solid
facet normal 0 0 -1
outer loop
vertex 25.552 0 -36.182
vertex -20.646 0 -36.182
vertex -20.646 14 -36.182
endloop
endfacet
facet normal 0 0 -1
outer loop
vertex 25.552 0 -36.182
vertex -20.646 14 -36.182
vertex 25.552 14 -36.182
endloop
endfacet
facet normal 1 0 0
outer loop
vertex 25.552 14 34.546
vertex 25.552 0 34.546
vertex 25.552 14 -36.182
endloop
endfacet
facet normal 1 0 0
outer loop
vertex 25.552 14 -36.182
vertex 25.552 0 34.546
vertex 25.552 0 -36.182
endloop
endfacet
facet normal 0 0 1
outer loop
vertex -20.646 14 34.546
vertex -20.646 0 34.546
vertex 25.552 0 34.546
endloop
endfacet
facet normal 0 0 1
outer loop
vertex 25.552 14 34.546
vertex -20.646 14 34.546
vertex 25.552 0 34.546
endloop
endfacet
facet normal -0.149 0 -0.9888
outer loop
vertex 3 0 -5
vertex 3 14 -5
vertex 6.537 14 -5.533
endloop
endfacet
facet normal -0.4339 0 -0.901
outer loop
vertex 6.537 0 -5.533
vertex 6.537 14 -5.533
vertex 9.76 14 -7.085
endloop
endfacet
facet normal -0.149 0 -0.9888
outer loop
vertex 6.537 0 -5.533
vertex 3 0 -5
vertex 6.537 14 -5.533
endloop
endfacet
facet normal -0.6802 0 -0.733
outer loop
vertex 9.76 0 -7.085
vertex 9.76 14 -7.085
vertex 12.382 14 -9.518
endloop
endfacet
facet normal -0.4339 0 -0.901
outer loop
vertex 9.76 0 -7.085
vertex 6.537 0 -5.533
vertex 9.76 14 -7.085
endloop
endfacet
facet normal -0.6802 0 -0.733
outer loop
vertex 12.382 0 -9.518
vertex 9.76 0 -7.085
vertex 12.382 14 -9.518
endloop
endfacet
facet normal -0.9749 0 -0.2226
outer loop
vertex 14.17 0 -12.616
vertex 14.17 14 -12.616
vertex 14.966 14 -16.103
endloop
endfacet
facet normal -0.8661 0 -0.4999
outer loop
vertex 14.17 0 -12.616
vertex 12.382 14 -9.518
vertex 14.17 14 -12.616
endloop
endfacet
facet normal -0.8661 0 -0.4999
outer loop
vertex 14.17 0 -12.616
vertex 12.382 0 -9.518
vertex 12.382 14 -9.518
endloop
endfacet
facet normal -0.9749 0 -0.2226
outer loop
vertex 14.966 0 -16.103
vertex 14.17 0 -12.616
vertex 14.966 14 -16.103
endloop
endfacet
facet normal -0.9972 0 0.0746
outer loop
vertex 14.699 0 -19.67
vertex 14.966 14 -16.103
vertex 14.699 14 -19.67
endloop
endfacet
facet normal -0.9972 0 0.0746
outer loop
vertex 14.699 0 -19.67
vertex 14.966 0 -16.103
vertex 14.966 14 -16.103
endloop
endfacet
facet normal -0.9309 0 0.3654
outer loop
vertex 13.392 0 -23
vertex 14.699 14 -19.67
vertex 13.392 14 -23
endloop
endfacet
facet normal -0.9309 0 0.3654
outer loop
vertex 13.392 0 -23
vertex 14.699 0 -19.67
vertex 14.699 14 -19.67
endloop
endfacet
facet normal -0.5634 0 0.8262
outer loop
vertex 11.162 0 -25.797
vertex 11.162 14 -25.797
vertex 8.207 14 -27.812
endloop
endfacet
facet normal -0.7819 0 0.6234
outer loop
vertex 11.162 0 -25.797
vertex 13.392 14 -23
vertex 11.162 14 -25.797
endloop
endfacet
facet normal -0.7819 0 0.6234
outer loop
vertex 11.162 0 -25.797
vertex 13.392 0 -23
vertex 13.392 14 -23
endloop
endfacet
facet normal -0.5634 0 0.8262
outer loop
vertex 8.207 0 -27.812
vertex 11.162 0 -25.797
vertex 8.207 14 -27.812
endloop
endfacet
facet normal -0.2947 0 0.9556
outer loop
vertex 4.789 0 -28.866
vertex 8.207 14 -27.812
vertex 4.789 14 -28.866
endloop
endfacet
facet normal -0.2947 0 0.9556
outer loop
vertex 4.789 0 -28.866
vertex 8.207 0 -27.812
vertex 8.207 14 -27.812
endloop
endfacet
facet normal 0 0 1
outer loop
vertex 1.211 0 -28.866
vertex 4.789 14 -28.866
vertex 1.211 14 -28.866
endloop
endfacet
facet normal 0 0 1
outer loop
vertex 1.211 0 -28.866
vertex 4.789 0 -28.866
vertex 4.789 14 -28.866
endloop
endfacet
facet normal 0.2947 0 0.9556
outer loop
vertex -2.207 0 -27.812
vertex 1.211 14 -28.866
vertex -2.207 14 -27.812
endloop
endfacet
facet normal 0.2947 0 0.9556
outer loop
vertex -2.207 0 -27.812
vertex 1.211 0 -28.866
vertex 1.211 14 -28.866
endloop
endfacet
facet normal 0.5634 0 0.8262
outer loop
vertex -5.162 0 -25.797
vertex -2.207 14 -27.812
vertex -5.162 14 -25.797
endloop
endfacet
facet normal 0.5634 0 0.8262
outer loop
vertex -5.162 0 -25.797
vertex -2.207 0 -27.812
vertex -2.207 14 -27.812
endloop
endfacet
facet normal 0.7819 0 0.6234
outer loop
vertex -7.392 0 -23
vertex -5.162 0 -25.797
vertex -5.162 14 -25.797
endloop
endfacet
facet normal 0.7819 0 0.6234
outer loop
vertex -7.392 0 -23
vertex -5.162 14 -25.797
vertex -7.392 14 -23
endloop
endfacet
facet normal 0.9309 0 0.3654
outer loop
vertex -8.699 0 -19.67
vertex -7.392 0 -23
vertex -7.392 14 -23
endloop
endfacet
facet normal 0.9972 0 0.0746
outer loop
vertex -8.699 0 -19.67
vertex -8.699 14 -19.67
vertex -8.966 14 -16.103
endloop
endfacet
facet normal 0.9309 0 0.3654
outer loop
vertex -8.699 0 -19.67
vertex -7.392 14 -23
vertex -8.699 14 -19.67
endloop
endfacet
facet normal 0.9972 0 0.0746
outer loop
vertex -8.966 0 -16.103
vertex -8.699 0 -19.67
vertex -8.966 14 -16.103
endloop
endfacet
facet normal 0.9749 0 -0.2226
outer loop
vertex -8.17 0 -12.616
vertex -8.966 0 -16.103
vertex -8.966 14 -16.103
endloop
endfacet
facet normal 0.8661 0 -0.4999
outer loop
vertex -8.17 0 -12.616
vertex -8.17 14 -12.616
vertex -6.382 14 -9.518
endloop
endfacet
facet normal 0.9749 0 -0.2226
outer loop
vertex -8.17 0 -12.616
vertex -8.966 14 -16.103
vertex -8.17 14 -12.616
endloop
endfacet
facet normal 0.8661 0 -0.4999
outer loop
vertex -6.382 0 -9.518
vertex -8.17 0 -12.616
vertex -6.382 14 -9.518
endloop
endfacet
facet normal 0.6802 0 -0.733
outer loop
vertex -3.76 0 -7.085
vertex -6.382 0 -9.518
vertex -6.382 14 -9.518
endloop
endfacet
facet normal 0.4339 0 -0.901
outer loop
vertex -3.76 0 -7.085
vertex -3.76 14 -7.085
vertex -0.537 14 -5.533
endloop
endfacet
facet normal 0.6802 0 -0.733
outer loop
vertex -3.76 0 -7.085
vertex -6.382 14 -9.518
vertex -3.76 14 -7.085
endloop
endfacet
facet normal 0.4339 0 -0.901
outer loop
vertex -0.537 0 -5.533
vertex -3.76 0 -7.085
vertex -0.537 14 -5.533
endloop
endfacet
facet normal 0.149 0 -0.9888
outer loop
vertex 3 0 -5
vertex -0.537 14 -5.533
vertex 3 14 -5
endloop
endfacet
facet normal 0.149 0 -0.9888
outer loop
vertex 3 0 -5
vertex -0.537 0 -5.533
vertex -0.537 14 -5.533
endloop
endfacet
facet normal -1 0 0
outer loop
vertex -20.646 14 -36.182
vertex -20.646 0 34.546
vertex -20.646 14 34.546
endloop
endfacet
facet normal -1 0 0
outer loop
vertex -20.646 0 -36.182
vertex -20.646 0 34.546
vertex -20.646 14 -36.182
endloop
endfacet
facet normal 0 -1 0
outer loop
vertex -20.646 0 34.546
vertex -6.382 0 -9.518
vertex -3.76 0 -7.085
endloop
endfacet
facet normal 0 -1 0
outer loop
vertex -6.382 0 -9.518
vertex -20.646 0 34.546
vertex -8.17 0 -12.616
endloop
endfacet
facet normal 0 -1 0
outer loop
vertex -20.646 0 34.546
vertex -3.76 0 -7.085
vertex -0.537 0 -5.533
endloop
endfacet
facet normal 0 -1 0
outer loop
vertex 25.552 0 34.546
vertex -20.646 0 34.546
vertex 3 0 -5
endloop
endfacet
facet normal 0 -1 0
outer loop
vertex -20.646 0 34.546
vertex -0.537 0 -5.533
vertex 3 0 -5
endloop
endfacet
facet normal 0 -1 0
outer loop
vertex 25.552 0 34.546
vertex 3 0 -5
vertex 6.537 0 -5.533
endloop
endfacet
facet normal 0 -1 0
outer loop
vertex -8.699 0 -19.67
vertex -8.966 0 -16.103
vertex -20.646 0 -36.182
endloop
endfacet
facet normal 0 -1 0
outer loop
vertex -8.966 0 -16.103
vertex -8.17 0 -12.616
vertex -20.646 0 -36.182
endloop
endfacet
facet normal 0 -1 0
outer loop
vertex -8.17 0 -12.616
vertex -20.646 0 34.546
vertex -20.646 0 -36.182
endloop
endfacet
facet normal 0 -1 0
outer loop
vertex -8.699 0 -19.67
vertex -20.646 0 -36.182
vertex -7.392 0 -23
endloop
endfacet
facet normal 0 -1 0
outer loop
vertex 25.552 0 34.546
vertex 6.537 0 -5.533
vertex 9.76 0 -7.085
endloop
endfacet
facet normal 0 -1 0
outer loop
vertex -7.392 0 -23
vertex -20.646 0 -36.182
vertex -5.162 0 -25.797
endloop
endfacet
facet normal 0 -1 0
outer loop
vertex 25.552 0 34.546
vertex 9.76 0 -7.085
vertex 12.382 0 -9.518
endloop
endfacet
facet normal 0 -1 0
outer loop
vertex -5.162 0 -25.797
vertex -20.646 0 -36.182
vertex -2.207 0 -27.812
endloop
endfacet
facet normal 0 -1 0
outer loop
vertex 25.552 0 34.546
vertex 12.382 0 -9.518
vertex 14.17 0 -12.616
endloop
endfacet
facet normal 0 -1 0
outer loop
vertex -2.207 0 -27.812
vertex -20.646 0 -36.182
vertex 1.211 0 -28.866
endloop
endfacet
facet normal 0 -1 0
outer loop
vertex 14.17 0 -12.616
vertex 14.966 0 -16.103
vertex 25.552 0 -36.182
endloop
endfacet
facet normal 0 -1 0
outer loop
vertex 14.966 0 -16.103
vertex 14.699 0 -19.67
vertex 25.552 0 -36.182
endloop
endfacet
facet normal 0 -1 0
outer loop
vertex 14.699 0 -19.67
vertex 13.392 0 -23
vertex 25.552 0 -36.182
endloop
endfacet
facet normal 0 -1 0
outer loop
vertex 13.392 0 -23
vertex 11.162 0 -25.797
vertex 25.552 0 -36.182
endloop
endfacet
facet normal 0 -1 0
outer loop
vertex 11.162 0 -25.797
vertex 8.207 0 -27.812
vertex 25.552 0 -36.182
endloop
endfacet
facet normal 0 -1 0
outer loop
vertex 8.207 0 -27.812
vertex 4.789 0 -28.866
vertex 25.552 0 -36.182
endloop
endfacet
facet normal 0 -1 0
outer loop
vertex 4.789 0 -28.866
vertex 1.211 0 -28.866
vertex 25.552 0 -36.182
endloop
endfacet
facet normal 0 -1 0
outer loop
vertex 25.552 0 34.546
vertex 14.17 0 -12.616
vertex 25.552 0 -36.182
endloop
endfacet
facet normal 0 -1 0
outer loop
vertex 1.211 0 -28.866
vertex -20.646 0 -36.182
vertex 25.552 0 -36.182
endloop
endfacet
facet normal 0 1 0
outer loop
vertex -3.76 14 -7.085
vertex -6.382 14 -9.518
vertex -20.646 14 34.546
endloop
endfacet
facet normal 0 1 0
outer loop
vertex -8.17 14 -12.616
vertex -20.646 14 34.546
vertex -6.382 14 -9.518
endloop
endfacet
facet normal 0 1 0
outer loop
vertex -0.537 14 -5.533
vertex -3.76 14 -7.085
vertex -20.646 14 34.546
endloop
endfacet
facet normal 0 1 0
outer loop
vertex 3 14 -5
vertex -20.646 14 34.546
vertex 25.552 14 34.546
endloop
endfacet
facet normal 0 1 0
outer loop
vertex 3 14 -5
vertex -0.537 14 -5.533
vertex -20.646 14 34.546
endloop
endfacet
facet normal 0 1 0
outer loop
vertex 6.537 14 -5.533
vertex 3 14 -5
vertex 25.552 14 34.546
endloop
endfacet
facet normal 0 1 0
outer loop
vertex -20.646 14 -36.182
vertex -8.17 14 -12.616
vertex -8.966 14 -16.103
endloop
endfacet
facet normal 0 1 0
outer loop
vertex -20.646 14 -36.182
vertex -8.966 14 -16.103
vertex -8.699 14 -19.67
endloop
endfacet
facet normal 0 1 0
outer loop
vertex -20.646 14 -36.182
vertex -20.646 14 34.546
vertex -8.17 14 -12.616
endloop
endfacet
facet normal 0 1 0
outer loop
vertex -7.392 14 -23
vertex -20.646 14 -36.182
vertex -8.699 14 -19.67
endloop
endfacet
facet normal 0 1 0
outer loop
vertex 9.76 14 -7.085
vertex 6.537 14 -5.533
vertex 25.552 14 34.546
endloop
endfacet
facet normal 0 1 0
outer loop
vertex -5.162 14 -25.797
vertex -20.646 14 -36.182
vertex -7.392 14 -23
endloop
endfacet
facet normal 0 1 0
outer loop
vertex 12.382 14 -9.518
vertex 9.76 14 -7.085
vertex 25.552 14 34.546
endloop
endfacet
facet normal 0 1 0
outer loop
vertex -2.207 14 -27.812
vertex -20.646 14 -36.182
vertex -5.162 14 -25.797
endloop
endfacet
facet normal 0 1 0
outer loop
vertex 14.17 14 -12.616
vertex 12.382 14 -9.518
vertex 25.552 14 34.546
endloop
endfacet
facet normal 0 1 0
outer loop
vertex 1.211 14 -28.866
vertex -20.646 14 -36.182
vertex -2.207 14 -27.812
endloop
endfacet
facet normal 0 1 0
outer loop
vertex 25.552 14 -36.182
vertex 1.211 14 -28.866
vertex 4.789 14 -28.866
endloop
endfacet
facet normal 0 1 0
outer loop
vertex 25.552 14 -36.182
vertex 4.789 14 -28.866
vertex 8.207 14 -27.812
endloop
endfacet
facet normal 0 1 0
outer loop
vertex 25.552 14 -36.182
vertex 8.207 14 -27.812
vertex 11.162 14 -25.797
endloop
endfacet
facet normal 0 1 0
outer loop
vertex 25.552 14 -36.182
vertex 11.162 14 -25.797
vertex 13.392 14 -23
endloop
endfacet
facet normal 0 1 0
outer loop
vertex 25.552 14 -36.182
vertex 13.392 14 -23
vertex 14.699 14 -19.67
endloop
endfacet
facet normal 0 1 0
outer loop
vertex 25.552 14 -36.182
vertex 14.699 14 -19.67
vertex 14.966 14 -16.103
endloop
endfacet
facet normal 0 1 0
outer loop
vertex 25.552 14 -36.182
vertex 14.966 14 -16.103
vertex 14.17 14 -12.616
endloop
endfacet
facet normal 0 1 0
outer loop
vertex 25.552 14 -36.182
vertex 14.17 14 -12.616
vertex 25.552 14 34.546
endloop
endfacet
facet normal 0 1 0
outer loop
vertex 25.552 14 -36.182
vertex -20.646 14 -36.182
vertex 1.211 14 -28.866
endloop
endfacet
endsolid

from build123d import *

# Parameters (mm, degrees)
IZIM1_W                     = 46.198257095
IZIM1_H                     = 70.728305111
Y_KSEKLIK_EKSTR_ZYON1_DEPTH = 14
IZIM2_R                     = 12
KES_EKSTR_ZYON1_DEPTH       = 15


with BuildPart() as part:
    # Çizim1 → Yükseklik-Ekstrüzyon1 (new body)
    with BuildSketch(Plane(origin=(0, 0, 0), x_dir=(1, 0, 0), z_dir=(0, 1, 0))):
        with Locations((2.453004802, 0.817668268)):
            Rectangle(IZIM1_W, IZIM1_H)
    extrude(amount=Y_KSEKLIK_EKSTR_ZYON1_DEPTH)

    # Çizim2 → Kes-Ekstrüzyon1 (cut)
    with BuildSketch(Plane(origin=(0, 0, 0), x_dir=(1, 0, 0), z_dir=(0, 1, 0))):
        with Locations(Location((3, 17, 0), (0, 0, 270))):
            Circle(IZIM2_R)
    extrude(amount=KES_EKSTR_ZYON1_DEPTH, mode=Mode.SUBTRACT)


solid = part.part
